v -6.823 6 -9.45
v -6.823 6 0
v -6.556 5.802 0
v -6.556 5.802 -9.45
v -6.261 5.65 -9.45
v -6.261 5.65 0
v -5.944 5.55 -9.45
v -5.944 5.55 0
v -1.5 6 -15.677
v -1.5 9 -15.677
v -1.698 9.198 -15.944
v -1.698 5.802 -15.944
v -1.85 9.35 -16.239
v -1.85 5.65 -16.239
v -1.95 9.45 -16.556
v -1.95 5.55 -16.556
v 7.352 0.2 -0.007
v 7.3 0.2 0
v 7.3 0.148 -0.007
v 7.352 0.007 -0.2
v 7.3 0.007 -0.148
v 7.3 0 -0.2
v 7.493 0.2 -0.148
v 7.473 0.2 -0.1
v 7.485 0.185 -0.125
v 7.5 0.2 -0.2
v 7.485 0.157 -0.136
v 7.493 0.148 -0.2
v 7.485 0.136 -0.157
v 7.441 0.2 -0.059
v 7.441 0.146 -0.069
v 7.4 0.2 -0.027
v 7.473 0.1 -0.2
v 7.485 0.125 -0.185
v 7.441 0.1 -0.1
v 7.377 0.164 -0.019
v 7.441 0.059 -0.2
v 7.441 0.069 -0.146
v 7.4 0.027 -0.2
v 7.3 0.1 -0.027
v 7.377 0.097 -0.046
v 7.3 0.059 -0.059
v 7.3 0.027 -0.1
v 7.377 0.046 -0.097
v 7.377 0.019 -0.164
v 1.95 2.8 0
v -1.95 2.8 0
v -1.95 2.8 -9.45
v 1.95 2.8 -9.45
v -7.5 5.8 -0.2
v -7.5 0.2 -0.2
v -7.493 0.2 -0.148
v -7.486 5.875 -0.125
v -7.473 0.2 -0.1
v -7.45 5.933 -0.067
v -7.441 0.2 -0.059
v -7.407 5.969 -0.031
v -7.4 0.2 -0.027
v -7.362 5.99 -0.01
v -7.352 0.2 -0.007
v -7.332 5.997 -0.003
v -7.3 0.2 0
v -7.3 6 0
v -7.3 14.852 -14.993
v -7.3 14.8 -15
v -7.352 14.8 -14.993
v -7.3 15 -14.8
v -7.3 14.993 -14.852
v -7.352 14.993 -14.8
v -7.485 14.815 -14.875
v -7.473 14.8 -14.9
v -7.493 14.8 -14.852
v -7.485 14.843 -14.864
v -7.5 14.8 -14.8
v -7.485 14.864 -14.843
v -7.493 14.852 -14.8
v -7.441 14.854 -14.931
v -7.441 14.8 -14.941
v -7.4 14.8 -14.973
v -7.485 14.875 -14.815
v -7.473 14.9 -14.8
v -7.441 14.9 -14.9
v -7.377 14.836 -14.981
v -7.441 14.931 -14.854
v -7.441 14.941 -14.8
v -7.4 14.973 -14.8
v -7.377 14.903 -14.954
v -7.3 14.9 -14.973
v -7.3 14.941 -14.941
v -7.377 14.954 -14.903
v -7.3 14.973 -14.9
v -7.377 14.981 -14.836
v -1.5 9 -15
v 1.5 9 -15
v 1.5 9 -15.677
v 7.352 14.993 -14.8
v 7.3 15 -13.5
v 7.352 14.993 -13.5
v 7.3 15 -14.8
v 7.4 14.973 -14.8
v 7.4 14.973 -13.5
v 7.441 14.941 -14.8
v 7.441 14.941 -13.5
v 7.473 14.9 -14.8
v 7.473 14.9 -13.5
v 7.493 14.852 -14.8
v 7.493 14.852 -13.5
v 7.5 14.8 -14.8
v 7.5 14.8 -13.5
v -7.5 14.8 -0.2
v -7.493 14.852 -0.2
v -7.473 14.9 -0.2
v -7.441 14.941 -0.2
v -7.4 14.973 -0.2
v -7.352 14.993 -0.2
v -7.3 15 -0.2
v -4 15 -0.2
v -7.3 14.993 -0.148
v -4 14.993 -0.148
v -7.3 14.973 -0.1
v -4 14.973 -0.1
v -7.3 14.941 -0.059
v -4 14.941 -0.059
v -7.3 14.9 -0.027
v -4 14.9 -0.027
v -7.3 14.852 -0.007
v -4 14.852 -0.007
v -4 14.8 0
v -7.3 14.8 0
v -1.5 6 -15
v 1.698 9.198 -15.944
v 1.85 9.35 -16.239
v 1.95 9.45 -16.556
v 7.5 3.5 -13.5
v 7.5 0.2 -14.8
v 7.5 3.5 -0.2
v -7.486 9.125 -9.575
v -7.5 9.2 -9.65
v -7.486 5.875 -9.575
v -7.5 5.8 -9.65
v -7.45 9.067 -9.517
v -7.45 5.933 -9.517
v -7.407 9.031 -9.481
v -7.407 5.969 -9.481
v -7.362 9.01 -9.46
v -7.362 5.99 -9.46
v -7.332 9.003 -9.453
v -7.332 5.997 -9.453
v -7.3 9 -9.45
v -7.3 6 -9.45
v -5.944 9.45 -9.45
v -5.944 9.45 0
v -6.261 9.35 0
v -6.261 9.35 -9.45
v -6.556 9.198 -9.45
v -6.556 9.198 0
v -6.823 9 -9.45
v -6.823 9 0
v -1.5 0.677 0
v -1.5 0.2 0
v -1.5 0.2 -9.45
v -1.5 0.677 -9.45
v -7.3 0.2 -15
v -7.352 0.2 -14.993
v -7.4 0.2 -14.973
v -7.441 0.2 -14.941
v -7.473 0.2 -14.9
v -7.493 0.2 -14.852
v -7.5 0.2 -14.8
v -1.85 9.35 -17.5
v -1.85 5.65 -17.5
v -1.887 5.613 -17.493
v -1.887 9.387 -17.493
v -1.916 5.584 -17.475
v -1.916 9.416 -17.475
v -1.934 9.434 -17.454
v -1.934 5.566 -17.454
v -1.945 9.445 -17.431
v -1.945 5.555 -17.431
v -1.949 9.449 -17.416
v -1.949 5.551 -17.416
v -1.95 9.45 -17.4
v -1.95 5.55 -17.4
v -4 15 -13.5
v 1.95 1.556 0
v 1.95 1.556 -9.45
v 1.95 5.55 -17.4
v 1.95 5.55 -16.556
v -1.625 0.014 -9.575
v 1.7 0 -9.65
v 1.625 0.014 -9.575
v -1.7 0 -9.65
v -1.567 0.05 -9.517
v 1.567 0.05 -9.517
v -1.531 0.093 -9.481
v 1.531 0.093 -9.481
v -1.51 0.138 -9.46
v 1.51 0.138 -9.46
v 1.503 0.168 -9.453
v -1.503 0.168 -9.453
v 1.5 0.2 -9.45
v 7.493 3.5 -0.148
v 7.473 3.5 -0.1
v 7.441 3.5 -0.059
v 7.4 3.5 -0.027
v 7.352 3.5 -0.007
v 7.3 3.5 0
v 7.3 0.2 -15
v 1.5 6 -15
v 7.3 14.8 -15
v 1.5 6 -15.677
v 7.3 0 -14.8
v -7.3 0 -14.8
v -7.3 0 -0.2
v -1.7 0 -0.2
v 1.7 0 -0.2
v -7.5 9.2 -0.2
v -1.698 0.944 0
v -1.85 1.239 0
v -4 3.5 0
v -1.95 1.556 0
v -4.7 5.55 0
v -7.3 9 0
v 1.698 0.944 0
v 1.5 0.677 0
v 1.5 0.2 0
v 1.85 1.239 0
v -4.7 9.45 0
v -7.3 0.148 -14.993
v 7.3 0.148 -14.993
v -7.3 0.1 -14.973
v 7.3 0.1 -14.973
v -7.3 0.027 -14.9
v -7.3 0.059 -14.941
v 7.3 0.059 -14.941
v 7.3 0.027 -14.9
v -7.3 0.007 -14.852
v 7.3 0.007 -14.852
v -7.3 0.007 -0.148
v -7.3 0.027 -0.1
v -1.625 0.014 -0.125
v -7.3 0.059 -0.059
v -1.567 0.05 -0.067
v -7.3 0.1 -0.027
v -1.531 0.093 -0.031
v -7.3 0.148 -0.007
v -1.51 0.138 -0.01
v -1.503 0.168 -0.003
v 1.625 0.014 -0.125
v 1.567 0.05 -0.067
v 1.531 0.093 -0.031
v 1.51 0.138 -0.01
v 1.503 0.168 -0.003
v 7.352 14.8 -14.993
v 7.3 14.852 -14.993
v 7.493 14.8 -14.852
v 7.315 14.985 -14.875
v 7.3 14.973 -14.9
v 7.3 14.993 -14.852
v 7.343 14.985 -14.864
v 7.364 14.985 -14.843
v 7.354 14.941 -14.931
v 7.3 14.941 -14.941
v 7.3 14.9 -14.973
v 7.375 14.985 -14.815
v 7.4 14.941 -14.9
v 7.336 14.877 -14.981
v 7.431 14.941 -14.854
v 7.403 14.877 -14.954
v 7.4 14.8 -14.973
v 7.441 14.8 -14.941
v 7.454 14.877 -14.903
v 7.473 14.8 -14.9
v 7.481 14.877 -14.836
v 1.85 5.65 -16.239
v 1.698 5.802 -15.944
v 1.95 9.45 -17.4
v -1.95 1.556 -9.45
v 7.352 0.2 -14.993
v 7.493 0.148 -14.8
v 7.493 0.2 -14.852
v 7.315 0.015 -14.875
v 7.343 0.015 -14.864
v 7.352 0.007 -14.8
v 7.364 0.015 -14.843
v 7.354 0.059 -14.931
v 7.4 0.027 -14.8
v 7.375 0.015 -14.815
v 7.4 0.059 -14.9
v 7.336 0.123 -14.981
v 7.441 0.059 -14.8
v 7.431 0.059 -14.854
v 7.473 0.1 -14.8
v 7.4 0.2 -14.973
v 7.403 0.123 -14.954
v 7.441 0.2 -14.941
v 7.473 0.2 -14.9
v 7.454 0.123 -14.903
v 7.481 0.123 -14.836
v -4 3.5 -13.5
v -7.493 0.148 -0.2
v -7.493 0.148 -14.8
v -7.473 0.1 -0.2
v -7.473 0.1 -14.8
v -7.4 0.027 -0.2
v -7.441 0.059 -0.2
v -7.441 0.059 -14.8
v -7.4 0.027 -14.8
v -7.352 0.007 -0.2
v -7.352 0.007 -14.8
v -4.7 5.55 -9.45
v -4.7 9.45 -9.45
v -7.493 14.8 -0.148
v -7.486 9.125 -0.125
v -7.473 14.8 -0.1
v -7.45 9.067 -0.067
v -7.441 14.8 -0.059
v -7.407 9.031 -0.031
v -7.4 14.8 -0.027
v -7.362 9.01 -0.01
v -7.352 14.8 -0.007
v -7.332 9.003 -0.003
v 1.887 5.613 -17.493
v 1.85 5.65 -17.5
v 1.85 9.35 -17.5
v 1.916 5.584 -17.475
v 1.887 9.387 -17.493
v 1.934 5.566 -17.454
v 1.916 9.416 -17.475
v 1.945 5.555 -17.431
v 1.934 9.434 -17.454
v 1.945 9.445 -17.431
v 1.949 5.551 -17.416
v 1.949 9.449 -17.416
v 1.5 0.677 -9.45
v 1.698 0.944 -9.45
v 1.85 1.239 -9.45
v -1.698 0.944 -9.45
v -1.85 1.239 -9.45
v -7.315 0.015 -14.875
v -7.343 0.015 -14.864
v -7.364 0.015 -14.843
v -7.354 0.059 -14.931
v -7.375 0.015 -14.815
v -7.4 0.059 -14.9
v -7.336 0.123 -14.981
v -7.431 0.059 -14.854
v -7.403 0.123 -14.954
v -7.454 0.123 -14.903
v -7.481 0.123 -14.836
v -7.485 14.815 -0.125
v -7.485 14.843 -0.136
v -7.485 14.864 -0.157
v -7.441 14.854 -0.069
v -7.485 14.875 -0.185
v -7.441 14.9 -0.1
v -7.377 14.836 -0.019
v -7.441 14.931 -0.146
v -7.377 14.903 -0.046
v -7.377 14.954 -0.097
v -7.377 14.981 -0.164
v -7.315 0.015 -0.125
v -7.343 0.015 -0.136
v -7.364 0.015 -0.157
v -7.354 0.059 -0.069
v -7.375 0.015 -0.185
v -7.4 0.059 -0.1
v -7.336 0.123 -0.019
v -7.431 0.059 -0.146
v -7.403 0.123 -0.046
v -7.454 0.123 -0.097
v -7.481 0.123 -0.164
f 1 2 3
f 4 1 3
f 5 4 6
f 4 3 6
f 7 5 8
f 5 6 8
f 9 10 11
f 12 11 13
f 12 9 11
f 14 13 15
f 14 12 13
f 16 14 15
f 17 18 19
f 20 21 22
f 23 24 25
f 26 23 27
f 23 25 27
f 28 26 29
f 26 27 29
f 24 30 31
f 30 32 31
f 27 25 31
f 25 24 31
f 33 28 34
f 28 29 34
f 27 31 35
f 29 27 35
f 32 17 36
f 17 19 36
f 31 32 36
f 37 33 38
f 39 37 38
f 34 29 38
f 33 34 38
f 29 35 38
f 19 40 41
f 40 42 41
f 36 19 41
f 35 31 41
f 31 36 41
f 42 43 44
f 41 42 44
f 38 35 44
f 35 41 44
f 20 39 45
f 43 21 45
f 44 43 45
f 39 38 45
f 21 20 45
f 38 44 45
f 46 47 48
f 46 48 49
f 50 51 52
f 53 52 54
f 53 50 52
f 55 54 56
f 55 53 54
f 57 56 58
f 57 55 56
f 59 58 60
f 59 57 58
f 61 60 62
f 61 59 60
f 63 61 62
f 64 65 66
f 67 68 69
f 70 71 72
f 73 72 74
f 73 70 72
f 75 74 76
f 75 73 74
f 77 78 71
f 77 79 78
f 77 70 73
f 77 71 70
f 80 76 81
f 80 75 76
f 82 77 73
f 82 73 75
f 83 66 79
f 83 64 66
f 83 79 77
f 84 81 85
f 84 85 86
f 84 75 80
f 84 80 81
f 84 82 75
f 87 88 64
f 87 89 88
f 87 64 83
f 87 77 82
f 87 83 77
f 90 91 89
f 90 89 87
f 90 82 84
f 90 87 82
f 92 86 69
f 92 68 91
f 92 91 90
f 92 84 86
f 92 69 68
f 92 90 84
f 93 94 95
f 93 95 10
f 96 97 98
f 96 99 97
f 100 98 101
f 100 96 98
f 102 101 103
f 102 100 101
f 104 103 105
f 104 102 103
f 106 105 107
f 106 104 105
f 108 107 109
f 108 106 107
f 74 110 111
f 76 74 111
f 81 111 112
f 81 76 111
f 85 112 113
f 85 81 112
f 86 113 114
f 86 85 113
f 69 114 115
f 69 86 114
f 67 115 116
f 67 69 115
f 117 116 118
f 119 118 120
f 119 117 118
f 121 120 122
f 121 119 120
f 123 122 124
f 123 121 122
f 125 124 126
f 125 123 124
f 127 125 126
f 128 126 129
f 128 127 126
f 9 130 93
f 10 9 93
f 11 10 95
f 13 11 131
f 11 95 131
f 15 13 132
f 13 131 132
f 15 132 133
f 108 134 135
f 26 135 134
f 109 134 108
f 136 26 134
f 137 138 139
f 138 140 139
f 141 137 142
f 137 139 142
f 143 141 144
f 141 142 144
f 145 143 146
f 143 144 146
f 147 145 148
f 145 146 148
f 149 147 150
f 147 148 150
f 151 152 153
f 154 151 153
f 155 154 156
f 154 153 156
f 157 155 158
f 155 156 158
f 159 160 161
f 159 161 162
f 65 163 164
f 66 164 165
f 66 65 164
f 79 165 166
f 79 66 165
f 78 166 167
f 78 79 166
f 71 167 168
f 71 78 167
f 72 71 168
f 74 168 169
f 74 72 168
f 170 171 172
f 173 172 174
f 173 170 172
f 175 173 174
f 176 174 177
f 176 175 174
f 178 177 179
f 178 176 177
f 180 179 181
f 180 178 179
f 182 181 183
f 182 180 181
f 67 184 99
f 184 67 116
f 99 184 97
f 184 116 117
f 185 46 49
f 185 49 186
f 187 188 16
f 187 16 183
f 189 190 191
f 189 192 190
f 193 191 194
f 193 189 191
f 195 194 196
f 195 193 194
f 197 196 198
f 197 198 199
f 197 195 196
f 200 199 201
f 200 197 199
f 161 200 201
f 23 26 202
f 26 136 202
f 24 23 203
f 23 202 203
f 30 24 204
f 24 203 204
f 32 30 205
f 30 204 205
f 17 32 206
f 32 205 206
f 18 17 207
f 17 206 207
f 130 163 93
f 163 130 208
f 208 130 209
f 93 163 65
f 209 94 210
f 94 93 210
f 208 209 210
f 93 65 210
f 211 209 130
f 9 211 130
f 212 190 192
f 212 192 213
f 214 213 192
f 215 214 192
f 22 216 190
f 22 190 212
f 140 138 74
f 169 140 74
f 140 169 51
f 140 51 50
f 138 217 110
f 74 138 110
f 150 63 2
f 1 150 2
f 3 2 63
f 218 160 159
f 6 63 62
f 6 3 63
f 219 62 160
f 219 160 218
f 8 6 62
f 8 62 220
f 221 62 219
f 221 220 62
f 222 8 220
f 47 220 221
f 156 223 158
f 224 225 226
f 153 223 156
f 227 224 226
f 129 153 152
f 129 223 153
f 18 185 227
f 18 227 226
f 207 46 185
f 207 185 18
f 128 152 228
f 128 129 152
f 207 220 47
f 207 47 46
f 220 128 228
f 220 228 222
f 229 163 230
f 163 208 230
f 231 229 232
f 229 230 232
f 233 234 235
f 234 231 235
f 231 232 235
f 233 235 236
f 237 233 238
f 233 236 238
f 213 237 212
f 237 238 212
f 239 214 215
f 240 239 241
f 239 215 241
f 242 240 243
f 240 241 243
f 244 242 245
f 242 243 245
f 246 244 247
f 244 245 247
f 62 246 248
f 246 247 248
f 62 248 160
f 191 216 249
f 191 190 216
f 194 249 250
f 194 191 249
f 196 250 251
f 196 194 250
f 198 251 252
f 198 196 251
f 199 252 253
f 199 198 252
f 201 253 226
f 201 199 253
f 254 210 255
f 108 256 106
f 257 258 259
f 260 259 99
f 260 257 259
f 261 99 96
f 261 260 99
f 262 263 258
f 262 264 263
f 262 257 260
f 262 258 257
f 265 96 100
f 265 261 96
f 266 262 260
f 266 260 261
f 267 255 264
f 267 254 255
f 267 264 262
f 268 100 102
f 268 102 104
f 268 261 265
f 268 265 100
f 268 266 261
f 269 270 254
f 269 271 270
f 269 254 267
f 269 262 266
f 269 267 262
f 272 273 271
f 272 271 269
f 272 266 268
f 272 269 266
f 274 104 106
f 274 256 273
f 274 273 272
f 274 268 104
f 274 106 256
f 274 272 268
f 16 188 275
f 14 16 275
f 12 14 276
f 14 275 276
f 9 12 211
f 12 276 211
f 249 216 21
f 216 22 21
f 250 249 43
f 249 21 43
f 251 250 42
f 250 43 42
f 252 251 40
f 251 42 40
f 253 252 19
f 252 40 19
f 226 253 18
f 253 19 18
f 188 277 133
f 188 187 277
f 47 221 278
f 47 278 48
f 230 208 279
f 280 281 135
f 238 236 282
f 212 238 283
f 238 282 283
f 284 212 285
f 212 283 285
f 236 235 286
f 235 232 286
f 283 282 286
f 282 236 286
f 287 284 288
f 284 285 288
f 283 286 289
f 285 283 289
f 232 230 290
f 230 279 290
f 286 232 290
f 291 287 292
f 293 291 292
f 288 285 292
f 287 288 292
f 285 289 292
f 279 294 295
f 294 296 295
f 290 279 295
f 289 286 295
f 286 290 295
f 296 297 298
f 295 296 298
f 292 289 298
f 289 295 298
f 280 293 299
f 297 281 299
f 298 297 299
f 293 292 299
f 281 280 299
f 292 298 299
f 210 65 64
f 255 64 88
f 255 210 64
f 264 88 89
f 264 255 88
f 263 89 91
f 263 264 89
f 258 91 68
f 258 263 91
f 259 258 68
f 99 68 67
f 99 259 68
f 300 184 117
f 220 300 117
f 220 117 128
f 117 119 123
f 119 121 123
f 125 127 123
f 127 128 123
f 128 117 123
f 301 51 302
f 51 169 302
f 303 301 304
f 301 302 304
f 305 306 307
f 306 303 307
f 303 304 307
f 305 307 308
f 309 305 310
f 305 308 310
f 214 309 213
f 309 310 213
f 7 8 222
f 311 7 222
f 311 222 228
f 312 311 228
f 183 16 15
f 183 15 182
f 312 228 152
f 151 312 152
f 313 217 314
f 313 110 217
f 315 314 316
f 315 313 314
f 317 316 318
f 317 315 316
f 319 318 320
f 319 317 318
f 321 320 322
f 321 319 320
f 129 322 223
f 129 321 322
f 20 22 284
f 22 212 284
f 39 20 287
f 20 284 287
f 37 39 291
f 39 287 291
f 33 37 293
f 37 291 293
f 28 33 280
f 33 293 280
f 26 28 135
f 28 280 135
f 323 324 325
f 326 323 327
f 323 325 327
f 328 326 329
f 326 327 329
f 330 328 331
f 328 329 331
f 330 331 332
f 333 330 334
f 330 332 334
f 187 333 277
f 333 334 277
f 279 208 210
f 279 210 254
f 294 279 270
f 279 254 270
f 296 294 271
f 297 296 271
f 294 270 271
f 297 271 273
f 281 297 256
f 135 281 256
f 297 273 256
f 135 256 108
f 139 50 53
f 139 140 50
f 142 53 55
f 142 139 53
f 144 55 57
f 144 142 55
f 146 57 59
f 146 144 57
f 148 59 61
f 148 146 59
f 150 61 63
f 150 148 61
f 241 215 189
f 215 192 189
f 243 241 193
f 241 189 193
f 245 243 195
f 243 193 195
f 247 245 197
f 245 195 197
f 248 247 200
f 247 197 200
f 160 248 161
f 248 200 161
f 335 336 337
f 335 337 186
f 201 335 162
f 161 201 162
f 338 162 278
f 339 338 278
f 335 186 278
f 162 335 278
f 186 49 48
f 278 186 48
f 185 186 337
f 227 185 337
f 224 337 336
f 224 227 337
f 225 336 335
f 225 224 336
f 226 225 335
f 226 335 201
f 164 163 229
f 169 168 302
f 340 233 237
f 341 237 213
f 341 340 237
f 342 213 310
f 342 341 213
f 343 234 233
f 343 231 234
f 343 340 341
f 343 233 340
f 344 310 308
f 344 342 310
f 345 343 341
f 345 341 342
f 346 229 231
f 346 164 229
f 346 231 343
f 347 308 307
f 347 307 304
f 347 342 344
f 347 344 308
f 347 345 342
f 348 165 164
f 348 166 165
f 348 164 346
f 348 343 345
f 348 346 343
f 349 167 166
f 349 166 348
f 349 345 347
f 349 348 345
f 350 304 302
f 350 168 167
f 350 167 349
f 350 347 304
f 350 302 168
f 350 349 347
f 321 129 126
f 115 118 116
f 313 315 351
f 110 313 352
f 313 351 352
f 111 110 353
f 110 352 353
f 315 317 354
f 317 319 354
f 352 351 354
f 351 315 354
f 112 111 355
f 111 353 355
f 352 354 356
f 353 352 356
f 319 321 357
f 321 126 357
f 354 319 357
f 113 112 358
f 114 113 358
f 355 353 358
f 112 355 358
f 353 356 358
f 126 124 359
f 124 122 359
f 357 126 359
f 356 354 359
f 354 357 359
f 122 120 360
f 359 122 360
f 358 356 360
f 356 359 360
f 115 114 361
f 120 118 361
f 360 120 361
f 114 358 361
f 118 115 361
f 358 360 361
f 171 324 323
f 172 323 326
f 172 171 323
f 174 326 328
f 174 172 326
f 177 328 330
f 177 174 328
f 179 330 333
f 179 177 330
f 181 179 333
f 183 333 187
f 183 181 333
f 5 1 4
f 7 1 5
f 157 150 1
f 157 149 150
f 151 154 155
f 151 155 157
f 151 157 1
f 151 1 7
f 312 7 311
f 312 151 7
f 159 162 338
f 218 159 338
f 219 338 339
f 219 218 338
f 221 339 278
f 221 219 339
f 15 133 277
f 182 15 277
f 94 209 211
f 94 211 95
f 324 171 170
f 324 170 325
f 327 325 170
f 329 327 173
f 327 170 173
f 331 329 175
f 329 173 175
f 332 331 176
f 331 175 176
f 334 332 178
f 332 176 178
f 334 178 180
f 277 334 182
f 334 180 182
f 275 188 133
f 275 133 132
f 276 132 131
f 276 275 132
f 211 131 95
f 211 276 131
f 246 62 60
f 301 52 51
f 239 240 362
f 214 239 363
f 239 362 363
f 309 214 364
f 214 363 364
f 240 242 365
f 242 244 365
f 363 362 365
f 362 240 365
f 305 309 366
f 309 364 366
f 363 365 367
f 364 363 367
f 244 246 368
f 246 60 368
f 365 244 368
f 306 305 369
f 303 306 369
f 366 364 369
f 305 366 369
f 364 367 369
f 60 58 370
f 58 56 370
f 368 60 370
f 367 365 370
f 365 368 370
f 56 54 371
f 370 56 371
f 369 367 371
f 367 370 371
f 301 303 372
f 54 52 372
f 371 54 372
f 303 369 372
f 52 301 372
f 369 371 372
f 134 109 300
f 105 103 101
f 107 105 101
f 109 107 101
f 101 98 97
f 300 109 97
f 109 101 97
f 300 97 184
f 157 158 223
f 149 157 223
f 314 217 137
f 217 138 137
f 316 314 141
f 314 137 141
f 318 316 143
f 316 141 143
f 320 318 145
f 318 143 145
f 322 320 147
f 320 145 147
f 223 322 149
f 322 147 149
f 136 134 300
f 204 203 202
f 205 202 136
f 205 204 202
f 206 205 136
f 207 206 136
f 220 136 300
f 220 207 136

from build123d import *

# Parameters (mm, degrees)
SKETCH_1_W           = 15
SKETCH_1_H           = 15
EXTRUDE_1_DEPTH      = 15
SKETCH_2_W           = 11.5
SKETCH_2_H           = 13.5
CUT_EXTRUDE_1_DEPTH  = 11.5
CUT_EXTRUDE_2_DEPTH  = 9.45
SKETCH_4_W           = 3
SKETCH_4_H           = 3
EXTRUDE_2_DEPTH      = 1
EXTRUDE_3_DEPTH      = 2
EXTRUDE_3_DEPTH_BACK = 4
CUT_EXTRUDE_3_REACH  = 26.911
SKETCH_6_W           = 0.944409721
SKETCH_6_H           = 0.55
SKETCH_6_H_2         = 1.55
FILLET_1_R           = 0.1
FILLET_2_R           = 0.2


with BuildPart() as part:
    # 草图1 → 凸台-拉伸1 (new body)
    with BuildSketch(Plane.XY):
        with Locations((0, 7.5)):
            Rectangle(SKETCH_1_W, SKETCH_1_H)
    extrude(amount=-EXTRUDE_1_DEPTH)

    # 草图2 → 切除-拉伸1 (cut)
    with BuildSketch(Plane(origin=(0, 15, 0), x_dir=(-1, 0, 0), z_dir=(0, 1, 0))):
        with Locations((-1.75, -6.75)):
            Rectangle(SKETCH_2_W, SKETCH_2_H)
    extrude(amount=-CUT_EXTRUDE_1_DEPTH, mode=Mode.SUBTRACT)

    # 草图3 → 切除-拉伸2 (cut)
    with BuildSketch(Plane.XY):
        with BuildLine():
            Line((-1.5, 0), (-1.5, 0.677124344))
            ThreePointArc((-1.5, 0.677124344), (-1.780042303, 1.088161527), (-1.95, 1.555590279))
            Line((-1.95, 1.555590279), (-1.95, 2.8))
            Line((-1.95, 2.8), (1.95, 2.8))
            Line((1.95, 2.8), (1.95, 1.555590279))
            ThreePointArc((1.95, 1.555590279), (1.780042303, 1.088161527), (1.5, 0.677124344))
            Line((1.5, 0.677124344), (1.5, 0))
            Line((1.5, 0), (-1.5, 0))
        make_face()
        with BuildLine():
            Line((-7.5, 9), (-7.5, 6))
            Line((-7.5, 6), (-6.822875656, 6))
            ThreePointArc((-6.822875656, 6), (-6.411838473, 5.719957697), (-5.944409721, 5.55))
            Line((-5.944409721, 5.55), (-4.7, 5.55))
            Line((-4.7, 5.55), (-4.7, 9.45))
            Line((-4.7, 9.45), (-5.944409721, 9.45))
            ThreePointArc((-5.944409721, 9.45), (-6.411838473, 9.280042303), (-6.822875656, 9))
            Line((-6.822875656, 9), (-7.5, 9))
        make_face()
    extrude(amount=-CUT_EXTRUDE_2_DEPTH, mode=Mode.SUBTRACT)

    # 草图4 → 凸台-拉伸2 (add)
    with BuildSketch(Plane(origin=(0, 0, -15), x_dir=(-1, 0, 0), z_dir=(0, 0, -1))):
        with Locations((0, 7.5)):
            Rectangle(SKETCH_4_W, SKETCH_4_H)
    extrude(amount=EXTRUDE_2_DEPTH)

    # 草图5 → 凸台-拉伸3 (add, two sides: drawn at the far end of the back side and taken through both)
    with BuildSketch(Plane(origin=(0, 9, 0), x_dir=(-1, 0, 0), z_dir=(0, 1, 0)).offset(-EXTRUDE_3_DEPTH_BACK)):
        with BuildLine():
            Line((1.95, -17.5), (-1.95, -17.5))
            Line((-1.95, -17.5), (-1.95, -16.555590279))
            ThreePointArc((-1.95, -16.555590279), (-1.780042303, -16.088161527), (-1.5, -15.677124344))
            Line((-1.5, -15.677124344), (1.5, -15.677124344))
            ThreePointArc((1.5, -15.677124344), (1.780042303, -16.088161527), (1.95, -16.555590279))
            Line((1.95, -16.555590279), (1.95, -17.5))
        make_face()
    extrude(amount=EXTRUDE_3_DEPTH + EXTRUDE_3_DEPTH_BACK)

    # 草图6 → 切除-拉伸3 (cut, up to next)
    with BuildSketch(Plane(origin=(1.95, 0, 0), x_dir=(0, 0, -1), z_dir=(1, 0, 0)), mode=Mode.PRIVATE) as cut_extrude_3_sk1:
        with BuildLine():
            Line((16.555590279, 5), (16.555590279, 5.55))
            ThreePointArc((16.555590279, 5.55), (16.088161527, 5.719957697), (15.677124344, 6))
            Line((15.677124344, 6), (15.677124344, 5))
            Line((15.677124344, 5), (16.555590279, 5))
        make_face()
    cut_extrude_3_tool1 = extrude(cut_extrude_3_sk1.sketch, amount=-CUT_EXTRUDE_3_REACH, mode=Mode.PRIVATE) & part.part
    # 草图6 → 切除-拉伸3 (cut, up to next)
    with BuildSketch(Plane(origin=(1.95, 0, 0), x_dir=(0, 0, -1), z_dir=(1, 0, 0)), mode=Mode.PRIVATE) as cut_extrude_3_sk2:
        with Locations((17.02779514, 5.275)):
            Rectangle(SKETCH_6_W, SKETCH_6_H)
    cut_extrude_3_tool2 = extrude(cut_extrude_3_sk2.sketch, amount=-CUT_EXTRUDE_3_REACH, mode=Mode.PRIVATE) & part.part
    # 草图6 → 切除-拉伸3 (cut, up to next)
    with BuildSketch(Plane(origin=(1.95, 0, 0), x_dir=(0, 0, -1), z_dir=(1, 0, 0)), mode=Mode.PRIVATE) as cut_extrude_3_sk3:
        with Locations((17.02779514, 10.225)):
            Rectangle(SKETCH_6_W, SKETCH_6_H_2)
    cut_extrude_3_tool3 = extrude(cut_extrude_3_sk3.sketch, amount=-CUT_EXTRUDE_3_REACH, mode=Mode.PRIVATE) & part.part
    # 草图6 → 切除-拉伸3 (cut, up to next)
    with BuildSketch(Plane(origin=(1.95, 0, 0), x_dir=(0, 0, -1), z_dir=(1, 0, 0)), mode=Mode.PRIVATE) as cut_extrude_3_sk4:
        with BuildLine():
            ThreePointArc((15.677124344, 9), (16.088161527, 9.280042303), (16.555590279, 9.45))
            Line((16.555590279, 9.45), (16.555590279, 11))
            Line((16.555590279, 11), (15.677124344, 11))
            Line((15.677124344, 11), (15.677124344, 9))
        make_face()
    cut_extrude_3_tool4 = extrude(cut_extrude_3_sk4.sketch, amount=-CUT_EXTRUDE_3_REACH, mode=Mode.PRIVATE) & part.part
    add(cut_extrude_3_tool1.solids().sort_by_distance((1.95, 5.375771, -16.07186))[0], mode=Mode.SUBTRACT)
    add(cut_extrude_3_tool2.solids().sort_by_distance((1.95, 5.275, -17.027795))[0], mode=Mode.SUBTRACT)
    add(cut_extrude_3_tool3.solids().sort_by_distance((1.95, 10.225, -17.027795))[0], mode=Mode.SUBTRACT)
    add(cut_extrude_3_tool4.solids().sort_by_distance((1.95, 10.130885, -16.097603))[0], mode=Mode.SUBTRACT)

    # 圆角1
    fillet_1_edges = [part.edges().sort_by_distance(p)[0] for p in [
        (1.95, 7.5, -17.5),
        (-1.95, 7.5, -17.5),
        (0, 5.55, -17.5),
        (0, 9.45, -17.5),
    ]]
    fillet(fillet_1_edges, radius=FILLET_1_R)

    # 圆角2
    fillet_2_edges = [part.edges().sort_by_distance(p)[0] for p in [
        (7.5, 7.5, -15),
        (0, 15, -15),
        (-5.75, 15, 0),
        (4.5, 0, 0),
        (0, 0, -9.45),
        (1.5, 0, -4.725),
        (-1.5, 0, -4.725),
        (-7.5, 7.5, -15),
        (7.5, 1.75, 0),
        (-7.5, 3, 0),
        (-4.5, 0, 0),
        (-7.5, 7.5, -9.45),
        (-7.5, 6, -4.725),
        (-7.5, 9, -4.725),
        (-7.5, 12, 0),
        (0, 0, -15),
        (-7.5, 15, -7.5),
        (7.5, 15, -14.25),
        (7.5, 0, -7.5),
        (-7.5, 0, -7.5),
    ]]
    fillet(fillet_2_edges, radius=FILLET_2_R)


solid = part.part
